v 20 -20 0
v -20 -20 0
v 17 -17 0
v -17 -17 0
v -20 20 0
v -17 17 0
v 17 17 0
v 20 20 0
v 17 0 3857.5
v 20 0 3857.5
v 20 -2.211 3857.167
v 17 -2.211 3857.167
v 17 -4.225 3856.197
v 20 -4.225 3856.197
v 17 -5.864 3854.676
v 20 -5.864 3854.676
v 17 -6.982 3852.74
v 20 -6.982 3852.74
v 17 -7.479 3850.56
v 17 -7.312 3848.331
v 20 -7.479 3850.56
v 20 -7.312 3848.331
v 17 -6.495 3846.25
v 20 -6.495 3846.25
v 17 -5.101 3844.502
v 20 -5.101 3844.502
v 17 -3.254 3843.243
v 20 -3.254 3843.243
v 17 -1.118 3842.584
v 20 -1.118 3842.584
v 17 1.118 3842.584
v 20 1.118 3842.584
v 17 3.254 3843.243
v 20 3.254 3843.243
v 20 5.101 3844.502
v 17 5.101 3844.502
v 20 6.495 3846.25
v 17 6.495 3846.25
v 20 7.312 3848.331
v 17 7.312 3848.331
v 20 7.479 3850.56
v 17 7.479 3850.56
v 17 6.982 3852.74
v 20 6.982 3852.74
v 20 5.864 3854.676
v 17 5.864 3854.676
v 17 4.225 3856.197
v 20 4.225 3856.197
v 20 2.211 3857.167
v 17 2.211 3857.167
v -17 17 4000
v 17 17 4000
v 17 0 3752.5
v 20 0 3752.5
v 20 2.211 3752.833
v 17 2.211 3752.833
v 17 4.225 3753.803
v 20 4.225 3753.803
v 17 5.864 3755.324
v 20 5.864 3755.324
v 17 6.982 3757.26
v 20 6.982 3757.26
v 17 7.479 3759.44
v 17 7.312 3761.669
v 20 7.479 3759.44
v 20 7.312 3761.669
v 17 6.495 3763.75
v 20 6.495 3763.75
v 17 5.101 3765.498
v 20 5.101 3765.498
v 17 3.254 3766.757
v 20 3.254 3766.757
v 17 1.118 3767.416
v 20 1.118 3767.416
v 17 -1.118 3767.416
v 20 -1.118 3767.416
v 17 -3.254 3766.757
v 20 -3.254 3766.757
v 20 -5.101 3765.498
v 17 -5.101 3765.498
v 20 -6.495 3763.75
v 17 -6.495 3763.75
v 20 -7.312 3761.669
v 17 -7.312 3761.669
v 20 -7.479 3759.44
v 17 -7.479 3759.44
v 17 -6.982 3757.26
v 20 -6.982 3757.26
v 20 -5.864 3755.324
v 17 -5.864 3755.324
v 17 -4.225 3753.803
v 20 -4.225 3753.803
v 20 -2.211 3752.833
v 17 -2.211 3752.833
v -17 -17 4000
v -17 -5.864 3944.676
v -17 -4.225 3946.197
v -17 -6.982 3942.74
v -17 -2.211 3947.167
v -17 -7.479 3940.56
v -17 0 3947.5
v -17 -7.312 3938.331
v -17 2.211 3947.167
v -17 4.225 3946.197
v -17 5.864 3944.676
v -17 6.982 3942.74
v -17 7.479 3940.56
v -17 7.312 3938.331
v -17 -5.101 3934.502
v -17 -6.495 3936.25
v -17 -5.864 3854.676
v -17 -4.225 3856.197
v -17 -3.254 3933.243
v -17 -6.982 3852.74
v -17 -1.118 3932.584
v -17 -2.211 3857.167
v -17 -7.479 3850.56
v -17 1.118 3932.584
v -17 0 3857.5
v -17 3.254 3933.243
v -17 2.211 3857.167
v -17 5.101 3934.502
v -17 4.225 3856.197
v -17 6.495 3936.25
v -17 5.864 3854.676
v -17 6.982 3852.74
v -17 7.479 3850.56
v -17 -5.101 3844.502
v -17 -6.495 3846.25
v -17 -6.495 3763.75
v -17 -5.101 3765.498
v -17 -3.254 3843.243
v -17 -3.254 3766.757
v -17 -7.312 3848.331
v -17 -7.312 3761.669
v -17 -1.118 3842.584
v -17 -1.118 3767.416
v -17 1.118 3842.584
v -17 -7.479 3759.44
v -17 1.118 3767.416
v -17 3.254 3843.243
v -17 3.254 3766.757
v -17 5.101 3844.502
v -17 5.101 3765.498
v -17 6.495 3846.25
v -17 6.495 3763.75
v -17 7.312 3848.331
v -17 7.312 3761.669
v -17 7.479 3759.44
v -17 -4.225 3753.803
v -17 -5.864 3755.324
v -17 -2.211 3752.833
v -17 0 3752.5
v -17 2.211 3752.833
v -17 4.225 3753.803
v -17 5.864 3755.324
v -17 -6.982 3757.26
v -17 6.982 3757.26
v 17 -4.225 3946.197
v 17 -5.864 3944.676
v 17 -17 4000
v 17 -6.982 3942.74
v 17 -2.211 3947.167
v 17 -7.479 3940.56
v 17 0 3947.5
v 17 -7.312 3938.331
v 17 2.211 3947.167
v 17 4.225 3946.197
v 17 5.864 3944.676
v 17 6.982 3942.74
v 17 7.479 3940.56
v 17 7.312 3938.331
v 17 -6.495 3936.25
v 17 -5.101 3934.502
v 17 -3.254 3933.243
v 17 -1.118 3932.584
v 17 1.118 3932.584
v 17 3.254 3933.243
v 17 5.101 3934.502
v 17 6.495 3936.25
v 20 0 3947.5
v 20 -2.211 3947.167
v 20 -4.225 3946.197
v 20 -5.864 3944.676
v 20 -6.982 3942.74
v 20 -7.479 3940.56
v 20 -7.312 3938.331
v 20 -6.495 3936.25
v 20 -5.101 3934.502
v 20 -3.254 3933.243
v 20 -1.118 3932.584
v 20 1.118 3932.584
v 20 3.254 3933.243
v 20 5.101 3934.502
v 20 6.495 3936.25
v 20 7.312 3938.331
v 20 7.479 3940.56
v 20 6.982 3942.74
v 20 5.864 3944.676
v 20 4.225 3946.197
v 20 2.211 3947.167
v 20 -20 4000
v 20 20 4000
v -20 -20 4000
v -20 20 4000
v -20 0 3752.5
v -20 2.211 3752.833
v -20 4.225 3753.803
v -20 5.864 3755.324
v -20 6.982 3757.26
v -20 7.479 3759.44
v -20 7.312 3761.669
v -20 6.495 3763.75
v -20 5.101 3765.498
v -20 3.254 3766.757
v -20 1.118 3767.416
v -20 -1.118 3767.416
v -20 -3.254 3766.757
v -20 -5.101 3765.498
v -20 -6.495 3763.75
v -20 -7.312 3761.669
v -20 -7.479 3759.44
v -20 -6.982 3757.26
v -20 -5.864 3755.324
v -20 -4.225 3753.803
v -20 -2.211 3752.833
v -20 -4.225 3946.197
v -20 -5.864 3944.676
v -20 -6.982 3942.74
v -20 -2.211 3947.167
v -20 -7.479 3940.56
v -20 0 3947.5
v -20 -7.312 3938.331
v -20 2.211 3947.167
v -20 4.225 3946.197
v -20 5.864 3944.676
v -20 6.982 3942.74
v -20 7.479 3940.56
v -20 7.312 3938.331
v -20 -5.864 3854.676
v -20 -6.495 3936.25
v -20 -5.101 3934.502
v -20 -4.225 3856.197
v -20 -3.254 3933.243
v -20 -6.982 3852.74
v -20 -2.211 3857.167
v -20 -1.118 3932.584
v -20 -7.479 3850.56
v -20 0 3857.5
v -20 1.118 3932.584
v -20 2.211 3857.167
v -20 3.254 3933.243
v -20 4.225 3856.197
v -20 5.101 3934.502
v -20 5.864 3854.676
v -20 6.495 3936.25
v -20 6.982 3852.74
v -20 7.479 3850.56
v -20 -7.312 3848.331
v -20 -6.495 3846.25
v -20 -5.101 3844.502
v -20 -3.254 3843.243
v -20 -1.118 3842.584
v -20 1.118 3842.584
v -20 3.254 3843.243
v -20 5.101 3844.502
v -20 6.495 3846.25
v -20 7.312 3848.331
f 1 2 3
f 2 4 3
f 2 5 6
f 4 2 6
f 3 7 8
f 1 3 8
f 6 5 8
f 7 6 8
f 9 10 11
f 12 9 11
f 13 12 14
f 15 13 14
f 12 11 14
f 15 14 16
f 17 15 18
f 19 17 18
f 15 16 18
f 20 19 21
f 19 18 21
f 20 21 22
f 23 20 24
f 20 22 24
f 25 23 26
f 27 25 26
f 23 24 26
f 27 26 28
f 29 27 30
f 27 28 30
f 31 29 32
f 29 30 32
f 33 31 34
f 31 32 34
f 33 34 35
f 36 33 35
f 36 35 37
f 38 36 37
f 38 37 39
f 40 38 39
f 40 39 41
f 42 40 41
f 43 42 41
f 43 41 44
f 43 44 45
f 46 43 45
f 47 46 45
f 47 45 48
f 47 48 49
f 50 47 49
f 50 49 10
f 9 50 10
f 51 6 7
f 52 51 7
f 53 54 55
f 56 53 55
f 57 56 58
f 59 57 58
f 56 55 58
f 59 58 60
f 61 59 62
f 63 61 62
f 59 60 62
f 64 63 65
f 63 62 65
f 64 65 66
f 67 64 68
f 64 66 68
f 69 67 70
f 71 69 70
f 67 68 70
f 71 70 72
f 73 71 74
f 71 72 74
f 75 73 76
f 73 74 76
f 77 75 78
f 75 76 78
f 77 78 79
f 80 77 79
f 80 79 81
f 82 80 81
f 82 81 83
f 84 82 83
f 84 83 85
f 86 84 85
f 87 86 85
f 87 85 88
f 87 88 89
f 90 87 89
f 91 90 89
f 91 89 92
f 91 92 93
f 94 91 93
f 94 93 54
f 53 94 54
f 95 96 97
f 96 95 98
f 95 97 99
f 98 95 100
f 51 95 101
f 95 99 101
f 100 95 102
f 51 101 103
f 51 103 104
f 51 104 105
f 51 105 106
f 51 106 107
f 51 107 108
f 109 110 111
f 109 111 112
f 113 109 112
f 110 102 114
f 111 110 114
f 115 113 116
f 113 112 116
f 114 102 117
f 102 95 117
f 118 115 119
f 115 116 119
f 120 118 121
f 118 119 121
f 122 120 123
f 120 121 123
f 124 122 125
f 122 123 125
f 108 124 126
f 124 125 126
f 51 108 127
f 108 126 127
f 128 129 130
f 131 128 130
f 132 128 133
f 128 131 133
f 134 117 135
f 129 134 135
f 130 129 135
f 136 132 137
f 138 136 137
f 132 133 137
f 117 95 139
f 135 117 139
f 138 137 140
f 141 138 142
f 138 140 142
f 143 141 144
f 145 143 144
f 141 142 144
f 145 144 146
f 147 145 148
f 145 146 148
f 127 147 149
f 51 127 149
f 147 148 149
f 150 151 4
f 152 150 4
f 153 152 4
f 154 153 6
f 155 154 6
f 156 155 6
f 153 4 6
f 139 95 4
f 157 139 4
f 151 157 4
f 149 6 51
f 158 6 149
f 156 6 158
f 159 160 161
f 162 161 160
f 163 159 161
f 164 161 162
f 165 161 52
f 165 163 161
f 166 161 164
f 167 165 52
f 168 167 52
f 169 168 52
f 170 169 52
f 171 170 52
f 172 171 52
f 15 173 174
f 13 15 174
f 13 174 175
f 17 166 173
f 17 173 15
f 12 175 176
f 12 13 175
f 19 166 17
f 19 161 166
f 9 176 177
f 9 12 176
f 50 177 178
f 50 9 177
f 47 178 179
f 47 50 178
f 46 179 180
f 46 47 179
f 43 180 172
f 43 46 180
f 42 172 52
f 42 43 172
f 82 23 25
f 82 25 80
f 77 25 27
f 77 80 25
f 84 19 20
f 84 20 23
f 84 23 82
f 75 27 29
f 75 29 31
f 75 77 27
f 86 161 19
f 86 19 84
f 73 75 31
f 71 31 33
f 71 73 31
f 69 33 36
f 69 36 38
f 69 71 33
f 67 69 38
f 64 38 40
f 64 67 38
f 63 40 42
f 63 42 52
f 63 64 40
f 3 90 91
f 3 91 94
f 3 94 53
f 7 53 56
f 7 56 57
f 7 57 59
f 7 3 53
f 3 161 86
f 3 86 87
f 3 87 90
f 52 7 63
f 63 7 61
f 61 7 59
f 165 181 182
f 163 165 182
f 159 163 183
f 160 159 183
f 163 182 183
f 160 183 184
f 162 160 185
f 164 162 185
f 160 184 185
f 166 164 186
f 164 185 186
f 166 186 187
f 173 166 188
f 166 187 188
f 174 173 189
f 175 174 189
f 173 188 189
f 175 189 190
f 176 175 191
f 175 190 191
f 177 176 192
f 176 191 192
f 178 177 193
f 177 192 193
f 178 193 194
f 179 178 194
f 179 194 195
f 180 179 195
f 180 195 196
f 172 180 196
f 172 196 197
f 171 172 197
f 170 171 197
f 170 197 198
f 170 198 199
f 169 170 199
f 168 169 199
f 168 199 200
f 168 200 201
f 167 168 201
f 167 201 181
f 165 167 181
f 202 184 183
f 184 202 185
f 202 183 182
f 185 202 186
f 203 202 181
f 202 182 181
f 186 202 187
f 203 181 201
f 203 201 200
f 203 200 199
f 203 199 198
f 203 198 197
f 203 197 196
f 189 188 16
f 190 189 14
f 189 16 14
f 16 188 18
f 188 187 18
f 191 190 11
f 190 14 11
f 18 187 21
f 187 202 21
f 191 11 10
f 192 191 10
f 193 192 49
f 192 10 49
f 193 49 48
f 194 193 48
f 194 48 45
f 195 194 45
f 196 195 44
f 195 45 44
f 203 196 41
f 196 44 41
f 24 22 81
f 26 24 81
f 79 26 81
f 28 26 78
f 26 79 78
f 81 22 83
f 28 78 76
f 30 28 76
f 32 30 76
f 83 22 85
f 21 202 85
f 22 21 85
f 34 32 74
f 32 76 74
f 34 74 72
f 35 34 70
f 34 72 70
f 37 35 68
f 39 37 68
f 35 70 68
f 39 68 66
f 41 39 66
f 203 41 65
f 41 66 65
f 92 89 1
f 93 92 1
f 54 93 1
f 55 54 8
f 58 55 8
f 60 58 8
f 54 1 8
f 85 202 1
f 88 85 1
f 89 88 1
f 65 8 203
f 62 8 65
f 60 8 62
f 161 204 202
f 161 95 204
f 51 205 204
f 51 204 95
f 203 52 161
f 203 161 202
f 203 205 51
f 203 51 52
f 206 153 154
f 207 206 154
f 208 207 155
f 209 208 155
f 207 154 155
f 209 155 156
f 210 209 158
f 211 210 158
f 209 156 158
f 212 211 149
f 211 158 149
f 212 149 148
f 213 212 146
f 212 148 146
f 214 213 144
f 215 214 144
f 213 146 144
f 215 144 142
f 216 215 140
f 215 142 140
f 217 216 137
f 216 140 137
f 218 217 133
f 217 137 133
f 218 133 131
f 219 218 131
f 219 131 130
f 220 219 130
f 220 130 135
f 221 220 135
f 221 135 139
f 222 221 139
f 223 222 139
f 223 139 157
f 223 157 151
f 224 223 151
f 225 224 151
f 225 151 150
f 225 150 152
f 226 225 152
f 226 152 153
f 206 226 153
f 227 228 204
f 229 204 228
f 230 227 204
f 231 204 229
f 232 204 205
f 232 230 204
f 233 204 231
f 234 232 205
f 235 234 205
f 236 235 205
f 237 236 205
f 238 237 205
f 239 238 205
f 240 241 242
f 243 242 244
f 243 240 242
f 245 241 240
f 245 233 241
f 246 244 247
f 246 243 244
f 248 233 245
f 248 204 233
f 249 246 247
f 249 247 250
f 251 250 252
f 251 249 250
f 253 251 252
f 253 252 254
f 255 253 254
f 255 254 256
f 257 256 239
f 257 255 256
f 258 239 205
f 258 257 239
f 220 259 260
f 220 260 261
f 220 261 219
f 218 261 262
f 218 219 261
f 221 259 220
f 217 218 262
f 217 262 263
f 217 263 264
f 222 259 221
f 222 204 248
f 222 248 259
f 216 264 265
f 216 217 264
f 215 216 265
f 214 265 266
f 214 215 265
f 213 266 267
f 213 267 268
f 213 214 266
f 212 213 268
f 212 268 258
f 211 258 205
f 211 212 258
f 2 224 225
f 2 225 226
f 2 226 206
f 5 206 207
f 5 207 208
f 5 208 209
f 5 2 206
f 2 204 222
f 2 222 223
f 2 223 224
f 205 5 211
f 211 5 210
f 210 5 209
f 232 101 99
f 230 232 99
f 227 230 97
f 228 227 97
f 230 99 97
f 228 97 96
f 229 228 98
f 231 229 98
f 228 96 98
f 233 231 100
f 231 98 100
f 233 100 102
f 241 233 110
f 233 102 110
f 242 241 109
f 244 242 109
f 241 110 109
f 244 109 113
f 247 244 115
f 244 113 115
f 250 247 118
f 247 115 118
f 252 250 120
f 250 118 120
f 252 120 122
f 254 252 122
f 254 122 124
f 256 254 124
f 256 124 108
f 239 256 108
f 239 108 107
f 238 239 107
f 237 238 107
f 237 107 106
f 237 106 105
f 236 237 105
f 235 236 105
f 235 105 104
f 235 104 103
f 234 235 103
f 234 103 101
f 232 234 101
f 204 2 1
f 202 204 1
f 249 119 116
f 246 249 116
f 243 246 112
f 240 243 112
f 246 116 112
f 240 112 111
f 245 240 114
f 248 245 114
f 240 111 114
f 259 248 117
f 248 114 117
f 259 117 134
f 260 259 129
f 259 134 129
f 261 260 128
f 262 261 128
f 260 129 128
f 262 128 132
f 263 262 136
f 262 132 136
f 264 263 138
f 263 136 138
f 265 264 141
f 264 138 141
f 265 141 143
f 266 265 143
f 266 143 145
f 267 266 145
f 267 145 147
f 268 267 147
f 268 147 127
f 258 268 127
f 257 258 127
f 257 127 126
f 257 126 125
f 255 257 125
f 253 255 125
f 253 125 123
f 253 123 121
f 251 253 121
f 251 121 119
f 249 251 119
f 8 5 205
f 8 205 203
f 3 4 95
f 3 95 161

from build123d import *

# Parameters (mm, degrees)
CROQUIS1_W              = 40
CROQUIS1_H              = 40
CROQUIS1_W_2            = 34
CROQUIS1_H_2            = 34
SALIENTE_EXTRUIR1_DEPTH = 4000
CROQUIS2_R              = 7.5
CORTAR_EXTRUIR1_DEPTH   = 40


with BuildPart() as part:
    # Croquis1 → Saliente-Extruir1 (new body)
    with BuildSketch(Plane.XY):
        Rectangle(CROQUIS1_W, CROQUIS1_H)
        Rectangle(CROQUIS1_W_2, CROQUIS1_H_2, mode=Mode.SUBTRACT)
    extrude(amount=SALIENTE_EXTRUIR1_DEPTH)

    # Croquis2 → Cortar-Extruir1 (cut)
    with BuildSketch(Plane(origin=(20, 0, 0), x_dir=(0, 0, -1), z_dir=(1, 0, 0))):
        with BuildLine():
            ThreePointArc((-3932.5, 0), (-3940, 7.5), (-3947.5, 0))
            Line((-3947.5, 0), (-3932.5, 0))
        make_face()
        with BuildLine():
            Line((-3932.5, 0), (-3947.5, 0))
            ThreePointArc((-3947.5, 0), (-3940, -7.5), (-3932.5, 0))
        make_face()
        with BuildLine():
            ThreePointArc((-3842.5, 0), (-3850, 7.5), (-3857.5, 0))
            Line((-3857.5, 0), (-3842.5, 0))
        make_face()
        with BuildLine():
            Line((-3842.5, 0), (-3857.5, 0))
            ThreePointArc((-3857.5, 0), (-3850, -7.5), (-3842.5, 0))
        make_face()
        with Locations((-3760, 0)):
            Circle(CROQUIS2_R)
    extrude(amount=-CORTAR_EXTRUIR1_DEPTH, mode=Mode.SUBTRACT)


solid = part.part
